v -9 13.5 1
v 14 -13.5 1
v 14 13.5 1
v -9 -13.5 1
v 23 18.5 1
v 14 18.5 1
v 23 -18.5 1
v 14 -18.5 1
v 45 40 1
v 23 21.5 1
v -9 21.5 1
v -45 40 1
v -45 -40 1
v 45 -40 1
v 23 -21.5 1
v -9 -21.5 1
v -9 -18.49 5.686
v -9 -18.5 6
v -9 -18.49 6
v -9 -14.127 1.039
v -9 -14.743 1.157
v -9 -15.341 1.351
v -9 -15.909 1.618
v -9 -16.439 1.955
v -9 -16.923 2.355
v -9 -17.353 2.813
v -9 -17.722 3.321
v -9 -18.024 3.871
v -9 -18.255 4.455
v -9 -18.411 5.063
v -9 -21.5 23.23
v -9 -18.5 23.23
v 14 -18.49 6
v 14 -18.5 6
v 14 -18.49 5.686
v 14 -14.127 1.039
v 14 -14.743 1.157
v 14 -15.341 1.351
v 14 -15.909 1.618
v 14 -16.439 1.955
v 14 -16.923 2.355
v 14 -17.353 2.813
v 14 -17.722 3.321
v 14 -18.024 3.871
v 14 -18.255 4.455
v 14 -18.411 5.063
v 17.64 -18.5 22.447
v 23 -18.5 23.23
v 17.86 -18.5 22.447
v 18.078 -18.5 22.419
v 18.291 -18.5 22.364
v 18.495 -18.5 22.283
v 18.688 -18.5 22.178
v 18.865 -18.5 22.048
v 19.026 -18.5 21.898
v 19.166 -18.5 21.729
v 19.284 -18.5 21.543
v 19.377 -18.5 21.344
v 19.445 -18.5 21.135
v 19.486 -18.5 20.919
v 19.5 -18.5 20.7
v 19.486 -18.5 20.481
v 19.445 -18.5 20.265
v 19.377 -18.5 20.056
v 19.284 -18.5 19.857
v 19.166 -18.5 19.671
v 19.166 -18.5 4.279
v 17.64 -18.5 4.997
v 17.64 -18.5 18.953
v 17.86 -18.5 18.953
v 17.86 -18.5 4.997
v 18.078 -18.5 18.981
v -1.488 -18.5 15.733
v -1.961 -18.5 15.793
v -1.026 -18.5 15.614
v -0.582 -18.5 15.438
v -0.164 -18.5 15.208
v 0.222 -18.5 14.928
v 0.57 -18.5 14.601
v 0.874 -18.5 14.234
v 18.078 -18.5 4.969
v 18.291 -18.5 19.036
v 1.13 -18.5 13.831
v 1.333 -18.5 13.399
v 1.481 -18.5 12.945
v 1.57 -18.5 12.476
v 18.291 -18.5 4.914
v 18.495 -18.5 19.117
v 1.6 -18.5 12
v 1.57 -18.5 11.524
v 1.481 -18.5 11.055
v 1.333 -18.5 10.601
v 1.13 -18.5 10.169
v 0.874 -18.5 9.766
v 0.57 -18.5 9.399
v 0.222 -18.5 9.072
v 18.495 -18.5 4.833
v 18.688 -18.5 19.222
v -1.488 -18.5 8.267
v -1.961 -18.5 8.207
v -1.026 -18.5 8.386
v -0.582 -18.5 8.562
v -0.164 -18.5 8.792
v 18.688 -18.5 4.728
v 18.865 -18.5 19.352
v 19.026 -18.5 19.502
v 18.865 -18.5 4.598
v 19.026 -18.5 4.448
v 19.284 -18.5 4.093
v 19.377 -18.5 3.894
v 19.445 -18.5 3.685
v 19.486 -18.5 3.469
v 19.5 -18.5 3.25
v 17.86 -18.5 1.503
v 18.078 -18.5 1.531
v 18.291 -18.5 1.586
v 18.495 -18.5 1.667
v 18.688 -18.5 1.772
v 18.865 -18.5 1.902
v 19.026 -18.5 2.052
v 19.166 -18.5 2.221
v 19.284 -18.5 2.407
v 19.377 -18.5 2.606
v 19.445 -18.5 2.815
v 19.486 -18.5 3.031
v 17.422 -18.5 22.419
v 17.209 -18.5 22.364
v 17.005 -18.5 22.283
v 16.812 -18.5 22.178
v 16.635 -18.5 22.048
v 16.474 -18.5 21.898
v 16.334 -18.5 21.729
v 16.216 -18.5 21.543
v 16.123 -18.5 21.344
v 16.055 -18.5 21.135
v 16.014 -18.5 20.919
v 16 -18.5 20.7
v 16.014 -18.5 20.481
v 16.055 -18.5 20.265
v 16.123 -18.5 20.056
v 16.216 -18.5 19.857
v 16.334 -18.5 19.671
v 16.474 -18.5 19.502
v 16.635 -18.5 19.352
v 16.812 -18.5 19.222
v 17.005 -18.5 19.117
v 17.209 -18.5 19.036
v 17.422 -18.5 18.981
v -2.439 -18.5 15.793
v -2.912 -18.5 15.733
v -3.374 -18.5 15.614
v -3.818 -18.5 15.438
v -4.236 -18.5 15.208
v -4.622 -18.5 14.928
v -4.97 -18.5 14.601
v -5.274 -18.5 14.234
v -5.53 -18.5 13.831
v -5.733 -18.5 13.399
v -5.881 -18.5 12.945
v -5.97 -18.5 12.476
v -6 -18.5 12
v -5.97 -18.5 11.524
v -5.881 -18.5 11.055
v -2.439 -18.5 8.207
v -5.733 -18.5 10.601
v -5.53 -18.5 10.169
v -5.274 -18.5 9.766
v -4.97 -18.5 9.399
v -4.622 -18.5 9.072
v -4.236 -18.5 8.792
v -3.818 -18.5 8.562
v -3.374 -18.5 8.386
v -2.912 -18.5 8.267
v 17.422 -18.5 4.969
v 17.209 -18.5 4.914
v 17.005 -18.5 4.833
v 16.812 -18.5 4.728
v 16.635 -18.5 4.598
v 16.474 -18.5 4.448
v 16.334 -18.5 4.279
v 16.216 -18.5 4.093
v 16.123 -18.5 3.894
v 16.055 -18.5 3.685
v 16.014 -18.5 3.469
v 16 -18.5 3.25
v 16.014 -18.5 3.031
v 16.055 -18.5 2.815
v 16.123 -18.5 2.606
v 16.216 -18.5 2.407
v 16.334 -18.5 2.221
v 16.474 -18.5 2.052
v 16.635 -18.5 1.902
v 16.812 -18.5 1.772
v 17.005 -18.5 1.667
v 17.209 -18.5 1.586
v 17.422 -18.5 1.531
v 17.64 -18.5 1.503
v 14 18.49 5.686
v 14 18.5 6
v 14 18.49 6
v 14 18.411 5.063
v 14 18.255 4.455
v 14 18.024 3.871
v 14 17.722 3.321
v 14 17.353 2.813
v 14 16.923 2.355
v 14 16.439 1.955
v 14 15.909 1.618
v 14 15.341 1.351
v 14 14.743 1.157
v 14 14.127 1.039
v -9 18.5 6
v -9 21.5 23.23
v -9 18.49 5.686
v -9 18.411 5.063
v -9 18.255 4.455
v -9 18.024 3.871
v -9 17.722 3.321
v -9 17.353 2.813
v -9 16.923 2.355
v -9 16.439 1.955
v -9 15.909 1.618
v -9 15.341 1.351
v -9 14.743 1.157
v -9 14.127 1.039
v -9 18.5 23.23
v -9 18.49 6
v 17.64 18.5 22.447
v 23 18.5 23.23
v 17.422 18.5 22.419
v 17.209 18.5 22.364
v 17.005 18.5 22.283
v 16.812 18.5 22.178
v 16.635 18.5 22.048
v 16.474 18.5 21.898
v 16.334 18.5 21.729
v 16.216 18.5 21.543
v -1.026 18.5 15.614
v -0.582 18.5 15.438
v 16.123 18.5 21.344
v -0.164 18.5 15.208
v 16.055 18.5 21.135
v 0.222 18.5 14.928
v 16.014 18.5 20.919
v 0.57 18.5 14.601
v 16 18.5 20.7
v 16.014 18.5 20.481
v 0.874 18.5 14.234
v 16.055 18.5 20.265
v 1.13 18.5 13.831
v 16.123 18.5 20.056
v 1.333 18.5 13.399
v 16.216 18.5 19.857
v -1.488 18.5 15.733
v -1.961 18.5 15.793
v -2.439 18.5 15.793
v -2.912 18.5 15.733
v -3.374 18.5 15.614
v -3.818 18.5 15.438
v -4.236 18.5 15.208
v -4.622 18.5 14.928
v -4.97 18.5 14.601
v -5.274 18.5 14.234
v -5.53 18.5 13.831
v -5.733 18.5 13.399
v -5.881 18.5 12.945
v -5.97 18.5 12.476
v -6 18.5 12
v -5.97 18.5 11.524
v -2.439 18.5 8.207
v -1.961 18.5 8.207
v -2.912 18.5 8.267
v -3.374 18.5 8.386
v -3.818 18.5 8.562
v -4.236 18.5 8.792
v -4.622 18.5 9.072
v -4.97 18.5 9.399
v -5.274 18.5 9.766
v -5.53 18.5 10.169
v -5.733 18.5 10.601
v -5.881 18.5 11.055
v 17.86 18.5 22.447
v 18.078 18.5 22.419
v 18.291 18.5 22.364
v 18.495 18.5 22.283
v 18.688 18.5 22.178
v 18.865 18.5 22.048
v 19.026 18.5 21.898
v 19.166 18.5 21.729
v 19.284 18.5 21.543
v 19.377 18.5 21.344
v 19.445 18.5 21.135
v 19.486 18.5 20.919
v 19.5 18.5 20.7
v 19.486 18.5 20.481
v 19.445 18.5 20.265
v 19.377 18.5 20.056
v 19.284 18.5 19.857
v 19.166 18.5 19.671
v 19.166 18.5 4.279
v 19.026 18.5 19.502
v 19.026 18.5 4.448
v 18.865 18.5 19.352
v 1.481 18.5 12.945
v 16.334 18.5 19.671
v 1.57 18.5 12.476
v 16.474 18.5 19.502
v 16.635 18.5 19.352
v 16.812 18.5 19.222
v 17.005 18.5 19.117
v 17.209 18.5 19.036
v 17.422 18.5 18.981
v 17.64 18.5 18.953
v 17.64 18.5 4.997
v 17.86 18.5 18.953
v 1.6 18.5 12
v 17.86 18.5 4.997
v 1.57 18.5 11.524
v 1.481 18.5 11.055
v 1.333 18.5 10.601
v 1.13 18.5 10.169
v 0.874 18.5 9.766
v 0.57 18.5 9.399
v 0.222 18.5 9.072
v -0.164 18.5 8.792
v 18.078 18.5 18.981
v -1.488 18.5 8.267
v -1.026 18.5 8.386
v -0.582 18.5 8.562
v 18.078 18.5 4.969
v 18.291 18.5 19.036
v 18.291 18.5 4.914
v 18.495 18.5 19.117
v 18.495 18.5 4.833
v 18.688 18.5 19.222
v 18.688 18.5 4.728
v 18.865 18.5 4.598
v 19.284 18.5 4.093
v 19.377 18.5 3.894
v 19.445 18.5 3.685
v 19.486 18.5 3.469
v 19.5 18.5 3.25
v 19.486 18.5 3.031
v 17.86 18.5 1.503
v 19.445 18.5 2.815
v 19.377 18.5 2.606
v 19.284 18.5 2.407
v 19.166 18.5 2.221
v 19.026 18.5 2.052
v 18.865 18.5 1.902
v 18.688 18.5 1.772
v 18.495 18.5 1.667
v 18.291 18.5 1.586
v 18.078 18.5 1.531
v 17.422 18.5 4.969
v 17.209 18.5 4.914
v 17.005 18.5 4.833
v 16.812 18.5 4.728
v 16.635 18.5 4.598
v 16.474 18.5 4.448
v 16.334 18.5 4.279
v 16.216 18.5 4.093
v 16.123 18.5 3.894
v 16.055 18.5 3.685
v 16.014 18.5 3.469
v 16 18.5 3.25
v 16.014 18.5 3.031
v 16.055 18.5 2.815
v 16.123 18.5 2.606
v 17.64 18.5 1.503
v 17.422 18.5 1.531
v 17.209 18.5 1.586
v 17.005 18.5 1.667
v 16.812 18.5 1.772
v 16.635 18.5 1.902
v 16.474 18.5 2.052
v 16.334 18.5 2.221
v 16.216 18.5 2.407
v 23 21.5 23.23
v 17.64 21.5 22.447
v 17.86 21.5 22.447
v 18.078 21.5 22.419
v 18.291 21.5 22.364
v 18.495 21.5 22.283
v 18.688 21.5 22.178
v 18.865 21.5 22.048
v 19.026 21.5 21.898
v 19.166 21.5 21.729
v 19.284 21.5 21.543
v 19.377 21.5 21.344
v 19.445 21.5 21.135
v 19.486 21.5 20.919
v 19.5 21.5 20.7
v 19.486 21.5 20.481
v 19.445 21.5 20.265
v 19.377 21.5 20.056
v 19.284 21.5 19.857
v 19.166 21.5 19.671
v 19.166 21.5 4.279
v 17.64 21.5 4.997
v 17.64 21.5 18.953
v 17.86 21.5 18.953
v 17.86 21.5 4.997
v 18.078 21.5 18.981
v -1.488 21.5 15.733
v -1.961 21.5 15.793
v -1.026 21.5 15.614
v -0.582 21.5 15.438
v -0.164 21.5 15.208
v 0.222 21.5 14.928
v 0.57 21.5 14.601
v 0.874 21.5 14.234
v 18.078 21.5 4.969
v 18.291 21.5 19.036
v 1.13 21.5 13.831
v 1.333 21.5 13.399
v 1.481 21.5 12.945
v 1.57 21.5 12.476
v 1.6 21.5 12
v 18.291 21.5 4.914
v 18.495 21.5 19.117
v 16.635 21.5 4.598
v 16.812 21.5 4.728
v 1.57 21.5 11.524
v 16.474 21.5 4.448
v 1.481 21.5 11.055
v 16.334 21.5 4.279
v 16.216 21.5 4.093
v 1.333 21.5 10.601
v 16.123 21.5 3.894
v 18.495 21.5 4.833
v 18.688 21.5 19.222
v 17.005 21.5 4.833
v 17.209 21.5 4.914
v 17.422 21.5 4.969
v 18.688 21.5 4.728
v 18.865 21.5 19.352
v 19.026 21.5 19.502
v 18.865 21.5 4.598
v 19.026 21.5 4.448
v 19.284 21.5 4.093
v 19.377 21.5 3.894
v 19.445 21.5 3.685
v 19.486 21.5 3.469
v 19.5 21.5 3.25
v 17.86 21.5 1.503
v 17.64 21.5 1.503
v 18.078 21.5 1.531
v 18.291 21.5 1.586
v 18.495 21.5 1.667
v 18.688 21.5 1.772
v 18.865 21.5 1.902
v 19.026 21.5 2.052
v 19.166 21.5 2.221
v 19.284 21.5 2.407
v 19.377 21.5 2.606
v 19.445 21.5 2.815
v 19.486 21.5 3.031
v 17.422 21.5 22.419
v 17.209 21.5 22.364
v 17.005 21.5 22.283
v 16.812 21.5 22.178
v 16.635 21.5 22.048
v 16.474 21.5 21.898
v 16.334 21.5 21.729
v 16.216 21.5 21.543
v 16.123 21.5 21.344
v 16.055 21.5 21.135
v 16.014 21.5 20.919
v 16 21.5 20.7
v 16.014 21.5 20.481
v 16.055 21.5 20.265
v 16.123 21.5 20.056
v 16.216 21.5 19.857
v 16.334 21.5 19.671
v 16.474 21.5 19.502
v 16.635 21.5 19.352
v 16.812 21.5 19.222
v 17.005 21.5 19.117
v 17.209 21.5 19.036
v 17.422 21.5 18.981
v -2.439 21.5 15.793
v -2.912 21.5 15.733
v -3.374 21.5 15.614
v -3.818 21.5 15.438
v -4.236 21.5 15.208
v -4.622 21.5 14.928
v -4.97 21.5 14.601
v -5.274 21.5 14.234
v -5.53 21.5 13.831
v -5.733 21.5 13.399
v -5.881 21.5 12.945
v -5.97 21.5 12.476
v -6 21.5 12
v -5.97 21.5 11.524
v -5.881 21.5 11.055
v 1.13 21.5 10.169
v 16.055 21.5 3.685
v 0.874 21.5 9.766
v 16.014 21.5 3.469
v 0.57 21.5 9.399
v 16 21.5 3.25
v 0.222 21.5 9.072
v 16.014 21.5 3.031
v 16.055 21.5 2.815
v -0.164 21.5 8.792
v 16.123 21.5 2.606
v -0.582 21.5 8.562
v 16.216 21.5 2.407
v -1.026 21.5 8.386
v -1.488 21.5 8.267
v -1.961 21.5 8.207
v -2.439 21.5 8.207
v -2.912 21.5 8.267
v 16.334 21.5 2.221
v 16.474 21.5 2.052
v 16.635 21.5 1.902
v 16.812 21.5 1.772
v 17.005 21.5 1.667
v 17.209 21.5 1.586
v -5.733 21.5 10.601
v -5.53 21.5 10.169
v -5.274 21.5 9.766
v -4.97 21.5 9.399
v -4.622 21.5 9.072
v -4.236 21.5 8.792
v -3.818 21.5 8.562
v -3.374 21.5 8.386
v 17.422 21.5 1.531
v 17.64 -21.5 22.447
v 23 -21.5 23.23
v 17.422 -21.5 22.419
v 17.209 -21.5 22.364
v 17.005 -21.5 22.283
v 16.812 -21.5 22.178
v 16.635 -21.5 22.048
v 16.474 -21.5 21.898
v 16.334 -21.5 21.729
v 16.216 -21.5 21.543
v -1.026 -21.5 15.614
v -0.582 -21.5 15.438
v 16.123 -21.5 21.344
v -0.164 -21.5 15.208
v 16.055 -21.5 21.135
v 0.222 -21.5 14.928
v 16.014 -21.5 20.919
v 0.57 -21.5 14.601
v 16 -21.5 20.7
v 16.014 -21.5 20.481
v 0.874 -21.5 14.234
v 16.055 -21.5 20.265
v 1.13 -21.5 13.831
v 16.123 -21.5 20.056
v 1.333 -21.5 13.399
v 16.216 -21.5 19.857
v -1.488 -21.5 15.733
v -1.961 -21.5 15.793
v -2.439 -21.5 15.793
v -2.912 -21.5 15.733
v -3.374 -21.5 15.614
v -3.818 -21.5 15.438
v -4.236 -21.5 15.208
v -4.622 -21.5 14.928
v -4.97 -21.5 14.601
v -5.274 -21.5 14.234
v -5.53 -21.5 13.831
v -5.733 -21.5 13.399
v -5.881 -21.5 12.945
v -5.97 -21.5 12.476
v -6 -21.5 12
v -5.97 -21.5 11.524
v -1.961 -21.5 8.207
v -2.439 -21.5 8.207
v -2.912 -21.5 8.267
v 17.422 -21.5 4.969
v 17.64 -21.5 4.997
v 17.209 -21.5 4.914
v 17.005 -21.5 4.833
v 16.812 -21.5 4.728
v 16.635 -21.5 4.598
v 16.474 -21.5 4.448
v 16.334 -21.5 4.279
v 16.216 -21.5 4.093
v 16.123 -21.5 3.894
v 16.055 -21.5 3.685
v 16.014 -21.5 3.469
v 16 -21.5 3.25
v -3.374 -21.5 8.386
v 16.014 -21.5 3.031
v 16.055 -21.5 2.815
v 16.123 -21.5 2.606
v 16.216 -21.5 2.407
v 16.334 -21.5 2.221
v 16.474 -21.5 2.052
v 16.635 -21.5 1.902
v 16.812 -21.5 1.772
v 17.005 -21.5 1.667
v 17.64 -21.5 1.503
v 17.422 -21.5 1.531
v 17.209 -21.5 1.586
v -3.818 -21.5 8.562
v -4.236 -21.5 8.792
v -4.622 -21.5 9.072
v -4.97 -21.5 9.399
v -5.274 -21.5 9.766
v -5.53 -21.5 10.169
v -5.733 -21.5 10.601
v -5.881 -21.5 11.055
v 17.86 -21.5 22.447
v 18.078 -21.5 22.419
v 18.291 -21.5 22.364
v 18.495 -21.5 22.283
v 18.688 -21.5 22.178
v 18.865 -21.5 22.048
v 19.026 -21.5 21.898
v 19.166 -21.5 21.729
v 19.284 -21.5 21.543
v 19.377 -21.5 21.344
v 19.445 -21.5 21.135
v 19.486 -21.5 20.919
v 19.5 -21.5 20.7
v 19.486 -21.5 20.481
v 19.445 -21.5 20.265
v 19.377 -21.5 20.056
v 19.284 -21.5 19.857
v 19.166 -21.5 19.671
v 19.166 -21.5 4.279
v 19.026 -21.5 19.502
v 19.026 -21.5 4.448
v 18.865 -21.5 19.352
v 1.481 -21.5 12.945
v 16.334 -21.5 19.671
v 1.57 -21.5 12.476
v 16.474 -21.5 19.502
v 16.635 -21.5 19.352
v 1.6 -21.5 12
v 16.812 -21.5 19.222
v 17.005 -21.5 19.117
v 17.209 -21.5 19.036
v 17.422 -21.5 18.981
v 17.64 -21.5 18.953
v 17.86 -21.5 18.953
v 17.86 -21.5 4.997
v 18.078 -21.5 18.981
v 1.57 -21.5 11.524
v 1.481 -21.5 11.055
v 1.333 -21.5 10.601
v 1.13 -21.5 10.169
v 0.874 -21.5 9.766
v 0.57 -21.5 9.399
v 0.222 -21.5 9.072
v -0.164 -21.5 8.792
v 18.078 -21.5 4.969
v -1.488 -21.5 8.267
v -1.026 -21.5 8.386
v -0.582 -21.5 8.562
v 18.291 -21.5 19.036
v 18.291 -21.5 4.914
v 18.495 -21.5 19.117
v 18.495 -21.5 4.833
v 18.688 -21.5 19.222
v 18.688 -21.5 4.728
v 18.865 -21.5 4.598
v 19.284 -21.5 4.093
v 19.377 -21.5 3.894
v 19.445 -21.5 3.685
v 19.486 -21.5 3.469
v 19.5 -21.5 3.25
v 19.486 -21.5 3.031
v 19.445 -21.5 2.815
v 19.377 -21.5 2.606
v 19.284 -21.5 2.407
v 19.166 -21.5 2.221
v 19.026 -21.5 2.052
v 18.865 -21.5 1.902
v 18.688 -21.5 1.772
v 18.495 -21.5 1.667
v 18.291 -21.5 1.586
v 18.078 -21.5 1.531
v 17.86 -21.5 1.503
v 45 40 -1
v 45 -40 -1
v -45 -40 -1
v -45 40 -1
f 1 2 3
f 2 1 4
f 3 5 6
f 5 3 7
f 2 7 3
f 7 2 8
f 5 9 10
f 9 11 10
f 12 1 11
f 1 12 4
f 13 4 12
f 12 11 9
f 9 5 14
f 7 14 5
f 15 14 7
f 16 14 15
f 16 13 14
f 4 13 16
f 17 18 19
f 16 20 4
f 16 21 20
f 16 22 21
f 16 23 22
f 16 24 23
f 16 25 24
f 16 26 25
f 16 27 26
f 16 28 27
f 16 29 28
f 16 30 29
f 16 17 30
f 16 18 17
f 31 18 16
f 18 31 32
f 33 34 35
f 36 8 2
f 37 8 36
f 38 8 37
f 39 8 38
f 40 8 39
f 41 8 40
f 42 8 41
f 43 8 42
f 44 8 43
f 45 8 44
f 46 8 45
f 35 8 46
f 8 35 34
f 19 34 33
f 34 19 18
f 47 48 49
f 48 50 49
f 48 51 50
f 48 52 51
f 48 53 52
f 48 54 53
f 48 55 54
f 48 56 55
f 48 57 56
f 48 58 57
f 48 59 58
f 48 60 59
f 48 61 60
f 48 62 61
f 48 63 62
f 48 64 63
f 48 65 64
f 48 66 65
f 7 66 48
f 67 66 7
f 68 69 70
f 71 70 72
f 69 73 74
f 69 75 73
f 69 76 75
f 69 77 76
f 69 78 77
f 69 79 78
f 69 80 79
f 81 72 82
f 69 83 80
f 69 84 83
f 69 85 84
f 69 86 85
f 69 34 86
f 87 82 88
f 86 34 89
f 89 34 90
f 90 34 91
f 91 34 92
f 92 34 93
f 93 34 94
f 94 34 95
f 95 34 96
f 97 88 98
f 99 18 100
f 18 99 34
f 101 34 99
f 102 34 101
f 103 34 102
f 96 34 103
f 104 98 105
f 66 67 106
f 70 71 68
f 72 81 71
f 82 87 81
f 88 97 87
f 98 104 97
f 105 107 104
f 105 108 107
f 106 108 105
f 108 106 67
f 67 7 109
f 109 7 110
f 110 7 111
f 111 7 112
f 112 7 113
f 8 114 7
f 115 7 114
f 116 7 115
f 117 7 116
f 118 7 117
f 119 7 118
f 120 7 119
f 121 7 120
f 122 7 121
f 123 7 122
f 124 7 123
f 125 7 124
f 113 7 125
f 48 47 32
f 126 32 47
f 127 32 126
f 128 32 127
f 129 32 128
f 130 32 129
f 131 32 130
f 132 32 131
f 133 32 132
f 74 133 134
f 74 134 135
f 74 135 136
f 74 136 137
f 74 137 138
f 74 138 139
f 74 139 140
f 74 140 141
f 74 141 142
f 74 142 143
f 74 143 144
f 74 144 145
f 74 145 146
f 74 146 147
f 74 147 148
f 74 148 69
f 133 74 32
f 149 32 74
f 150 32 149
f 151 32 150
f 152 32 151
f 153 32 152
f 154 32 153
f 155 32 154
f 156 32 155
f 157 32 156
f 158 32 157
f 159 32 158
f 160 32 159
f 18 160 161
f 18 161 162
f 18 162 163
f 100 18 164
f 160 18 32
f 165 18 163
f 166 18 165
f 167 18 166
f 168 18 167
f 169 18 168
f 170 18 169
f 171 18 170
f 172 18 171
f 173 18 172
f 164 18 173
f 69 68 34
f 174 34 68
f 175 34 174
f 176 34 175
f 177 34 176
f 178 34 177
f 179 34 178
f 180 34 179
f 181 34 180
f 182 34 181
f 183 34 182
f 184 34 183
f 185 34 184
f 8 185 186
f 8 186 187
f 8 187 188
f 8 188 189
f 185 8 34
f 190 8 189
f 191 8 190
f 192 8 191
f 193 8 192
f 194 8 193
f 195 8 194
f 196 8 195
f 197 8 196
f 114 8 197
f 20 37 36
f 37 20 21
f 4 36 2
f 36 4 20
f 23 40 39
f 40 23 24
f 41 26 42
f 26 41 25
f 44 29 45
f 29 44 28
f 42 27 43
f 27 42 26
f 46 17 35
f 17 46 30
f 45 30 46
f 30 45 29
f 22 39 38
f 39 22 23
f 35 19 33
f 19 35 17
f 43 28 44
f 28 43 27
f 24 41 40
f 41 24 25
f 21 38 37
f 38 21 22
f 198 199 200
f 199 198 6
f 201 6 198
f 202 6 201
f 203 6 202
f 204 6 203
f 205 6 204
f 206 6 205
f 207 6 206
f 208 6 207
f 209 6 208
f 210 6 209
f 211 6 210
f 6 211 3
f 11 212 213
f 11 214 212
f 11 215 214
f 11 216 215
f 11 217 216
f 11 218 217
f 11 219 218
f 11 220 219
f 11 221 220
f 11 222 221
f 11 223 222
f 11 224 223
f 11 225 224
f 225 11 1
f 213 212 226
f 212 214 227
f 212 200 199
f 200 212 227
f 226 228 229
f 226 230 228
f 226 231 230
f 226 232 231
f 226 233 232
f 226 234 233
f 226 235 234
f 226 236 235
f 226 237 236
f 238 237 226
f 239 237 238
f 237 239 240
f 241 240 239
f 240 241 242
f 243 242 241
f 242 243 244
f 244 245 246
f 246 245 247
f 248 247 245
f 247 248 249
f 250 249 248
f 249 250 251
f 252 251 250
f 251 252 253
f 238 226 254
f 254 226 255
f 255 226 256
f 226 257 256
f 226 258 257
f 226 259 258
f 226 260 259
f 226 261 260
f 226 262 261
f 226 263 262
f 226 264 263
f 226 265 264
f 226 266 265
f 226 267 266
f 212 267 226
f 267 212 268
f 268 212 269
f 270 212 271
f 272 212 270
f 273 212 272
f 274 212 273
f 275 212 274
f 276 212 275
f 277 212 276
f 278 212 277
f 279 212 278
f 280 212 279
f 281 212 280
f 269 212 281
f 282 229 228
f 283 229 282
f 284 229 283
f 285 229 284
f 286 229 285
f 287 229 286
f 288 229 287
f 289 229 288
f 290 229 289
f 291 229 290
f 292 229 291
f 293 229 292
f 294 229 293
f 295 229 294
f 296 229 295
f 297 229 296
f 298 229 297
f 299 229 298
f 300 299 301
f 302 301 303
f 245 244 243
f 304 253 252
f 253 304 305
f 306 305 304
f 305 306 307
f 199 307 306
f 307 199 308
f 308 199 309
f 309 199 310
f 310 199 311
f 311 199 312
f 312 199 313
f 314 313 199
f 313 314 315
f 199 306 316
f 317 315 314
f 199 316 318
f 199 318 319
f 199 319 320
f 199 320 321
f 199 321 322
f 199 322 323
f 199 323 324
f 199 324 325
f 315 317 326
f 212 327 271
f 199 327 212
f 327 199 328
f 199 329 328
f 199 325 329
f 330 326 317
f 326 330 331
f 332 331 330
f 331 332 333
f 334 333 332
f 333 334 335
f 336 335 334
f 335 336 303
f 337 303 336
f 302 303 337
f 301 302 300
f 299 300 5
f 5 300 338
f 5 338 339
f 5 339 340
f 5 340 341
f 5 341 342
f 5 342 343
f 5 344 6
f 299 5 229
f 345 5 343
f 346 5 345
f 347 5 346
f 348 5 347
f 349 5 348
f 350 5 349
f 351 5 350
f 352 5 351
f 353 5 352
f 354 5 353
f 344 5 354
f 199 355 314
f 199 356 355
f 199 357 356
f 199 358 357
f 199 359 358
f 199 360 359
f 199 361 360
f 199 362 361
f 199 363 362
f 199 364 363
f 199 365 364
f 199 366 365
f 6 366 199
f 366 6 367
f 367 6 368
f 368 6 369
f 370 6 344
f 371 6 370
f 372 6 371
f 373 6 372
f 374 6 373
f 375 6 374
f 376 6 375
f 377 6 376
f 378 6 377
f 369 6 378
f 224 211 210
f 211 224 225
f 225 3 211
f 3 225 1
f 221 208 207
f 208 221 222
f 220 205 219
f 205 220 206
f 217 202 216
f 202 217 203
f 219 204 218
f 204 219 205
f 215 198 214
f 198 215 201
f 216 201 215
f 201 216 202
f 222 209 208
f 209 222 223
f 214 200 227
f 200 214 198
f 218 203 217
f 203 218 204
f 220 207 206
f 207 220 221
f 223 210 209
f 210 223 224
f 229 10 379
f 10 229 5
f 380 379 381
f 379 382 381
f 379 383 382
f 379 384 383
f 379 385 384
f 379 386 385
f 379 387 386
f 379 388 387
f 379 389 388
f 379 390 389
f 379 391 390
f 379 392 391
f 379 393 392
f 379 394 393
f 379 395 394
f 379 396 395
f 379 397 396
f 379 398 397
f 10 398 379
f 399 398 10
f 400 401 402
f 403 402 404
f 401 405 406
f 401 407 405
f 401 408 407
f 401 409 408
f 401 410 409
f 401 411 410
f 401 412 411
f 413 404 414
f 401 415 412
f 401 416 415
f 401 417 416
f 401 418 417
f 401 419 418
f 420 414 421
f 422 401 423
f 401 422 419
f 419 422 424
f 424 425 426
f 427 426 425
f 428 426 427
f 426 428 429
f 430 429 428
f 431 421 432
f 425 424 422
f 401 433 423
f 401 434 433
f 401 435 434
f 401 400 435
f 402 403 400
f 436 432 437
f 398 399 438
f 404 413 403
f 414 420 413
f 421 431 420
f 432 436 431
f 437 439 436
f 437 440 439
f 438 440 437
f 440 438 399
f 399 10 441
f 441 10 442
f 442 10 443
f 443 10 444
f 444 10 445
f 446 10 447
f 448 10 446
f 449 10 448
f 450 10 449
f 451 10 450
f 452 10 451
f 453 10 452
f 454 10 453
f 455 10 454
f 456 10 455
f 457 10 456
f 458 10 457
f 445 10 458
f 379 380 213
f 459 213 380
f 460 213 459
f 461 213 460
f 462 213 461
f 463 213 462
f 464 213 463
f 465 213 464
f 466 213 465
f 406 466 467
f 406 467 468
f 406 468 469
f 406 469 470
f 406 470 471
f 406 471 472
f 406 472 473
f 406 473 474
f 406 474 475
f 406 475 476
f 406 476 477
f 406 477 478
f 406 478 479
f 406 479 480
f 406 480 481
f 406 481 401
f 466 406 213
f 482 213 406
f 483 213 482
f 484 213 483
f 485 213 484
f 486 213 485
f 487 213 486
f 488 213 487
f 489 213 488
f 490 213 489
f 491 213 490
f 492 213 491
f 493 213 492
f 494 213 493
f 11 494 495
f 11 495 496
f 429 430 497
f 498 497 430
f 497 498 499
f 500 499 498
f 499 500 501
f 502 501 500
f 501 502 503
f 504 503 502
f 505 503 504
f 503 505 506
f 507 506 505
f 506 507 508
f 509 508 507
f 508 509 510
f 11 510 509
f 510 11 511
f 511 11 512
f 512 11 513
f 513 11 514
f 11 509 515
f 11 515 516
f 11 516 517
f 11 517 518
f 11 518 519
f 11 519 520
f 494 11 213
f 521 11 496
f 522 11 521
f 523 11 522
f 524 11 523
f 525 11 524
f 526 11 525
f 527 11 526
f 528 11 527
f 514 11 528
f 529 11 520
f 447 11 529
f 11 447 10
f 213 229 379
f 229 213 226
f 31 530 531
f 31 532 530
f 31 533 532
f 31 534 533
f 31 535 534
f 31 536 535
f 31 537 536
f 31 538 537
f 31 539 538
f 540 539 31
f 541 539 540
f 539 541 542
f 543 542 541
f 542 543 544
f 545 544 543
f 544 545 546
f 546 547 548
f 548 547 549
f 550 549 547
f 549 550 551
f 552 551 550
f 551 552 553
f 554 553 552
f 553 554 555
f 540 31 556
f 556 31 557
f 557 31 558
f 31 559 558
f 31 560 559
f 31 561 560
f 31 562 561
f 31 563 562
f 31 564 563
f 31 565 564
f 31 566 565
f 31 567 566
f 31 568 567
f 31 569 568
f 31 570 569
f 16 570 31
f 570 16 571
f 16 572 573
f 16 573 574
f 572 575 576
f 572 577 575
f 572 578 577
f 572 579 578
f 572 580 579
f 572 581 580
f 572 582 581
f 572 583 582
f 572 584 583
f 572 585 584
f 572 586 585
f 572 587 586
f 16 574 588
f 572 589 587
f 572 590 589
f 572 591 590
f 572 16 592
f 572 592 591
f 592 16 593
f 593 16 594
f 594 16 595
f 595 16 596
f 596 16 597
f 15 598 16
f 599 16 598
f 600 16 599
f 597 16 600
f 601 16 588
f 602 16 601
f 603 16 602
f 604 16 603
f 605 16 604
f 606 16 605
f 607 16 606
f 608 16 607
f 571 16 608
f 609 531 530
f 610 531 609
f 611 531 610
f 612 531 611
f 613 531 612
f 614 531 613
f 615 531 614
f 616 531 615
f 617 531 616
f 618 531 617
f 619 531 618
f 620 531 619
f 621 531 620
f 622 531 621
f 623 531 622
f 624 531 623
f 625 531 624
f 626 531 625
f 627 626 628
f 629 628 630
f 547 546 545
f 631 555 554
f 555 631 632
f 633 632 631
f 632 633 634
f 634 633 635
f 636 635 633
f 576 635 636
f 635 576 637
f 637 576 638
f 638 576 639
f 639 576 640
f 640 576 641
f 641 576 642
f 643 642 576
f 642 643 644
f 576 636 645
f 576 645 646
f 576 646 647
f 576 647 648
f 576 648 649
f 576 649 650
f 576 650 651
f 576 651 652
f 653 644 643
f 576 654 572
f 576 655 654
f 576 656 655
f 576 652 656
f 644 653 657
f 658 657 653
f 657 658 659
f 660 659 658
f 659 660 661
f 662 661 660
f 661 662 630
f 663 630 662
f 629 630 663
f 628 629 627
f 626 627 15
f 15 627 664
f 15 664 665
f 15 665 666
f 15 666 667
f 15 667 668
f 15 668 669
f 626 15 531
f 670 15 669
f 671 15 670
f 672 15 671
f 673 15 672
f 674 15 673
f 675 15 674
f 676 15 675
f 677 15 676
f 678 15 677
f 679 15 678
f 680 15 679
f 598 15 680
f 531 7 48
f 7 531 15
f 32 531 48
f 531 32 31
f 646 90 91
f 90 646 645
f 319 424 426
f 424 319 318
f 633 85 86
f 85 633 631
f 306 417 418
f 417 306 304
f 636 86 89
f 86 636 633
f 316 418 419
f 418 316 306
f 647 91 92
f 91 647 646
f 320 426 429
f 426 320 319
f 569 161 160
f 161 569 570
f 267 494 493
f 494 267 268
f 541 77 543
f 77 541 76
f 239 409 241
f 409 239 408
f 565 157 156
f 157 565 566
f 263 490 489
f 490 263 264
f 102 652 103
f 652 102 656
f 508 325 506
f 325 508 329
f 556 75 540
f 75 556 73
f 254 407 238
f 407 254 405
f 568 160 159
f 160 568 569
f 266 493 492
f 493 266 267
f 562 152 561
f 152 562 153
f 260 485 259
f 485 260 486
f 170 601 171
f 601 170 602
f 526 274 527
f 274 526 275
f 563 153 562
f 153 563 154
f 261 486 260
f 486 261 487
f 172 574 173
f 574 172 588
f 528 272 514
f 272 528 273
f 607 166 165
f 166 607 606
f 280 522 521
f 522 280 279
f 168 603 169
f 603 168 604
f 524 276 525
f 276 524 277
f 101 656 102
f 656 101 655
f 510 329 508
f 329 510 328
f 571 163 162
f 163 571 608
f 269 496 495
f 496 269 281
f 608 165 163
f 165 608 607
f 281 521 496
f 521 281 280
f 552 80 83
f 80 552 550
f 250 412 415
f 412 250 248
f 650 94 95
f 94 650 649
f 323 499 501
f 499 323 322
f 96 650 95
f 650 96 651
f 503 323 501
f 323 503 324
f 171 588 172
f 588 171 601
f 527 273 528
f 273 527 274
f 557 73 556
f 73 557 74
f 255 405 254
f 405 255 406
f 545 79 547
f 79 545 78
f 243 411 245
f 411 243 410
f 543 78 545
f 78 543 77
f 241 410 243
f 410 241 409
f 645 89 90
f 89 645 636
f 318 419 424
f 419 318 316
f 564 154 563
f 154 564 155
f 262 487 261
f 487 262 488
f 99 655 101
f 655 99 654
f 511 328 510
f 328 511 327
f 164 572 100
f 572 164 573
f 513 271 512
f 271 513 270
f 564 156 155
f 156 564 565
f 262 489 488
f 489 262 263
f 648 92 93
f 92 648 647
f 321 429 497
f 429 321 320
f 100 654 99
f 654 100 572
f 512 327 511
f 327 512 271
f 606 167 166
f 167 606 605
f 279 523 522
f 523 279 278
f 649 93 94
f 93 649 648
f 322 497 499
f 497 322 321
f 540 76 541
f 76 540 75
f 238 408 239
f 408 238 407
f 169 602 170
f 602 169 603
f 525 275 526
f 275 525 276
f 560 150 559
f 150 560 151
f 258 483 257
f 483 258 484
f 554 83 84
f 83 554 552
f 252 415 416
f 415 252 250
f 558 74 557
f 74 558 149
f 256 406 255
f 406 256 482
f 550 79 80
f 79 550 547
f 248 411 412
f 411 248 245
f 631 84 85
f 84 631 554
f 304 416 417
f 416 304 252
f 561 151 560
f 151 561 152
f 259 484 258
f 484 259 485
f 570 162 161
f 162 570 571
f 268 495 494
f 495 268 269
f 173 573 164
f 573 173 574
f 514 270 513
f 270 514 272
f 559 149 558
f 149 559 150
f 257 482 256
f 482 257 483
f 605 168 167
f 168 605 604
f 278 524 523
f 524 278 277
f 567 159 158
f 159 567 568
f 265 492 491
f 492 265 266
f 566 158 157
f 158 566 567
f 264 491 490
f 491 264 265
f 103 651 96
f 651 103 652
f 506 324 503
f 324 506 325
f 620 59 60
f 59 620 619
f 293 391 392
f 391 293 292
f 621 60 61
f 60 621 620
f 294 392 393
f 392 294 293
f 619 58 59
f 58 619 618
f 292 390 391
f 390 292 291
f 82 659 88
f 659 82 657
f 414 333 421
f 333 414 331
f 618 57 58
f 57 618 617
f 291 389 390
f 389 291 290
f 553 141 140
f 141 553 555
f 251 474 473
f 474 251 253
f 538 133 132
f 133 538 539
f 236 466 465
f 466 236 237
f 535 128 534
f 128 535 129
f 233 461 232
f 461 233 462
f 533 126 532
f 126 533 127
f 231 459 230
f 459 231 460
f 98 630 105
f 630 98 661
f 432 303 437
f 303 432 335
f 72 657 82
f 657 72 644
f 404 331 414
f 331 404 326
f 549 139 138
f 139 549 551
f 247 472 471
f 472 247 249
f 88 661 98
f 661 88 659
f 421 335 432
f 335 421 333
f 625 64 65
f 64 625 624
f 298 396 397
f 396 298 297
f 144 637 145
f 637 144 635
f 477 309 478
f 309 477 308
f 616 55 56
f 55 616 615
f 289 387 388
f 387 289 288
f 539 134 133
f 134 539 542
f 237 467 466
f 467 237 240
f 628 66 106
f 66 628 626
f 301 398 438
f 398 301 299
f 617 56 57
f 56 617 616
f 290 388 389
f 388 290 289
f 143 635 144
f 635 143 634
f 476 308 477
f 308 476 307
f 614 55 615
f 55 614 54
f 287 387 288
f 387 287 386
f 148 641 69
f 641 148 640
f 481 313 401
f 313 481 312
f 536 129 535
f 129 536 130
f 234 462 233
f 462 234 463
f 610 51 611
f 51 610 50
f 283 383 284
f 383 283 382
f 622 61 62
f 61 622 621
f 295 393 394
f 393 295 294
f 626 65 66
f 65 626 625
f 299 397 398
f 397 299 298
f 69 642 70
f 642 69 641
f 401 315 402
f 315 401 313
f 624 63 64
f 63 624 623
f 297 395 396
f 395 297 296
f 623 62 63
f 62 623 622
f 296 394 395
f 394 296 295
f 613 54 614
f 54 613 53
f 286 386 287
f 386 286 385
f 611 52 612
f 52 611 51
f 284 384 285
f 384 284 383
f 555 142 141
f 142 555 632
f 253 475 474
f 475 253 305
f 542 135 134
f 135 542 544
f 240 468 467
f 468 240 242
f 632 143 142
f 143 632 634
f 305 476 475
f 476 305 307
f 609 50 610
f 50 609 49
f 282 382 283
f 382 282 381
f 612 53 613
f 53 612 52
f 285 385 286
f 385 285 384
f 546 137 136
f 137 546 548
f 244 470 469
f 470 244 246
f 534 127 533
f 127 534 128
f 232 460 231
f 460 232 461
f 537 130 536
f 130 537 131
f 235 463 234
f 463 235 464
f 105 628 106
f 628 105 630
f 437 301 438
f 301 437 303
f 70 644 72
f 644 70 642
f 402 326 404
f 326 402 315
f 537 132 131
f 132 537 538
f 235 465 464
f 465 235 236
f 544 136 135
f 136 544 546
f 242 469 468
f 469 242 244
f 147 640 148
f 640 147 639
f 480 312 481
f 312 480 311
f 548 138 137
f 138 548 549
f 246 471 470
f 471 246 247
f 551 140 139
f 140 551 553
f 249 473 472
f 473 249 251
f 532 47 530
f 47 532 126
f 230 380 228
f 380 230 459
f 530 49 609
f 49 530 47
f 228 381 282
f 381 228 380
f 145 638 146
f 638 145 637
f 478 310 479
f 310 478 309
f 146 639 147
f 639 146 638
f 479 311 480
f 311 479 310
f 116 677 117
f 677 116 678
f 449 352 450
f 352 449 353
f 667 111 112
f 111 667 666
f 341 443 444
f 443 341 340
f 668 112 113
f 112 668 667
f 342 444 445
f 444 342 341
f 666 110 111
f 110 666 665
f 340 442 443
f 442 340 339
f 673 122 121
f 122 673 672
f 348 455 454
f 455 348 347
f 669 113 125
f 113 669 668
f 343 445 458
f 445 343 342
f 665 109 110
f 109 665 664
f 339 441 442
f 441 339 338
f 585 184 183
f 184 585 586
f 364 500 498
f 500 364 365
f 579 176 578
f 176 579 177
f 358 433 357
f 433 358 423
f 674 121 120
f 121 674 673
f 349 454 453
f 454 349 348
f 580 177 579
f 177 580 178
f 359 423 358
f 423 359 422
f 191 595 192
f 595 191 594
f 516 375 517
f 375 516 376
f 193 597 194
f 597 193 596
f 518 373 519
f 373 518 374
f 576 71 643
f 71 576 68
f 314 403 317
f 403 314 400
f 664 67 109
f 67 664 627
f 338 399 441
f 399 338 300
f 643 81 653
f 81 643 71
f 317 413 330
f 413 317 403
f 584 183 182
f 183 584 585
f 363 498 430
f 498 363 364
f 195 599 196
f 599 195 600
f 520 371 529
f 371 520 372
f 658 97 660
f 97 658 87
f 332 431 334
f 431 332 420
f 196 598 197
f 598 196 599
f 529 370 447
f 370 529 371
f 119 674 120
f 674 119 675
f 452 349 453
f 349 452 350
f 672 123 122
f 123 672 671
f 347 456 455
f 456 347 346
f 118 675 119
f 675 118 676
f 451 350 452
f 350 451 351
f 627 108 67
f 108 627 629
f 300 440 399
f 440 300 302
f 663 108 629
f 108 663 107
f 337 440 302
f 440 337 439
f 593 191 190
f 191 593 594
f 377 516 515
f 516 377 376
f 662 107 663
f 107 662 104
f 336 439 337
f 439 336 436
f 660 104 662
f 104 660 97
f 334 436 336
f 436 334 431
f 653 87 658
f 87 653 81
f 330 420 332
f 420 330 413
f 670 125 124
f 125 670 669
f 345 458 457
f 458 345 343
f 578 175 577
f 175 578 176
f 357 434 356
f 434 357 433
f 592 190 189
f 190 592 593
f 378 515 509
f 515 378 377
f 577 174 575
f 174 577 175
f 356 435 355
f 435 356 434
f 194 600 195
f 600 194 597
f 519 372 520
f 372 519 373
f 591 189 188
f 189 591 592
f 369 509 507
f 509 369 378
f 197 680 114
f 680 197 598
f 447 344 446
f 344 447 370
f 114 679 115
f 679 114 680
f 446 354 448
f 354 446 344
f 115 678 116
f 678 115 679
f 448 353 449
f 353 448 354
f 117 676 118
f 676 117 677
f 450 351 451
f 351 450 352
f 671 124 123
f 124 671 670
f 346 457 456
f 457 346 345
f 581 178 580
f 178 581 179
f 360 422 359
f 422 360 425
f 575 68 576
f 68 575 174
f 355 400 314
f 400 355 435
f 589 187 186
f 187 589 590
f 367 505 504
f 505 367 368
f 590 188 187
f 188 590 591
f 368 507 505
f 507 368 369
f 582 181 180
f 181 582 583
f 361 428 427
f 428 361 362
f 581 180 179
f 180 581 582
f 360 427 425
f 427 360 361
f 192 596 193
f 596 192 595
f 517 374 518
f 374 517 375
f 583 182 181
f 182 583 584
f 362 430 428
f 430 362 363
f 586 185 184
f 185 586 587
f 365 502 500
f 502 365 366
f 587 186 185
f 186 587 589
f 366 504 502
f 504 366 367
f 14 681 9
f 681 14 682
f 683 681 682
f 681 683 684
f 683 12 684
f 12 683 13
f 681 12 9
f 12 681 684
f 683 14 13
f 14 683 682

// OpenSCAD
$fn = 50;

//%translate([52.7,-0.6,88]) rotate([90,180,0]) import("solar.stl");

// base
cube([90,80,2], center=true);

difference()
{
    union()
    {
        // screwboard 1
        translate([7,20,(22.23/2)+1]) rotate([90,180,0]) difference()
        {
            cube([32,22.23,3], center=true);
        }

        // bevel 1
        translate([14,-13.5,6]) rotate([180,90,0]) difference()
        {
            cube([5,5,23]);
            translate([0,0,-1]) cylinder(h=27,d=10);
        }

        // screwboard 2
        translate([7,-20,(22.23/2)+1]) rotate([90,180,0]) difference()
        {
            cube([32,22.23,3], center=true);
        }

        // bevel 2
        translate([-9,13.5,6]) rotate([0,90,0]) difference()
        {
            cube([5,5,23]);
            translate([0,0,-1]) cylinder(h=27,d=10);
        }
    }

    // holes
    rotate([90,0,0])
    {
        translate([-2.2,12,0]) cylinder(d=7.6,h=90, center=true); // 4.6
        translate([17.75,20.7,0]) cylinder(d=3.5,h=90, center=true); // m3
        translate([17.75,3.25,0]) cylinder(d=3.5,h=90, center=true);
    }
}
